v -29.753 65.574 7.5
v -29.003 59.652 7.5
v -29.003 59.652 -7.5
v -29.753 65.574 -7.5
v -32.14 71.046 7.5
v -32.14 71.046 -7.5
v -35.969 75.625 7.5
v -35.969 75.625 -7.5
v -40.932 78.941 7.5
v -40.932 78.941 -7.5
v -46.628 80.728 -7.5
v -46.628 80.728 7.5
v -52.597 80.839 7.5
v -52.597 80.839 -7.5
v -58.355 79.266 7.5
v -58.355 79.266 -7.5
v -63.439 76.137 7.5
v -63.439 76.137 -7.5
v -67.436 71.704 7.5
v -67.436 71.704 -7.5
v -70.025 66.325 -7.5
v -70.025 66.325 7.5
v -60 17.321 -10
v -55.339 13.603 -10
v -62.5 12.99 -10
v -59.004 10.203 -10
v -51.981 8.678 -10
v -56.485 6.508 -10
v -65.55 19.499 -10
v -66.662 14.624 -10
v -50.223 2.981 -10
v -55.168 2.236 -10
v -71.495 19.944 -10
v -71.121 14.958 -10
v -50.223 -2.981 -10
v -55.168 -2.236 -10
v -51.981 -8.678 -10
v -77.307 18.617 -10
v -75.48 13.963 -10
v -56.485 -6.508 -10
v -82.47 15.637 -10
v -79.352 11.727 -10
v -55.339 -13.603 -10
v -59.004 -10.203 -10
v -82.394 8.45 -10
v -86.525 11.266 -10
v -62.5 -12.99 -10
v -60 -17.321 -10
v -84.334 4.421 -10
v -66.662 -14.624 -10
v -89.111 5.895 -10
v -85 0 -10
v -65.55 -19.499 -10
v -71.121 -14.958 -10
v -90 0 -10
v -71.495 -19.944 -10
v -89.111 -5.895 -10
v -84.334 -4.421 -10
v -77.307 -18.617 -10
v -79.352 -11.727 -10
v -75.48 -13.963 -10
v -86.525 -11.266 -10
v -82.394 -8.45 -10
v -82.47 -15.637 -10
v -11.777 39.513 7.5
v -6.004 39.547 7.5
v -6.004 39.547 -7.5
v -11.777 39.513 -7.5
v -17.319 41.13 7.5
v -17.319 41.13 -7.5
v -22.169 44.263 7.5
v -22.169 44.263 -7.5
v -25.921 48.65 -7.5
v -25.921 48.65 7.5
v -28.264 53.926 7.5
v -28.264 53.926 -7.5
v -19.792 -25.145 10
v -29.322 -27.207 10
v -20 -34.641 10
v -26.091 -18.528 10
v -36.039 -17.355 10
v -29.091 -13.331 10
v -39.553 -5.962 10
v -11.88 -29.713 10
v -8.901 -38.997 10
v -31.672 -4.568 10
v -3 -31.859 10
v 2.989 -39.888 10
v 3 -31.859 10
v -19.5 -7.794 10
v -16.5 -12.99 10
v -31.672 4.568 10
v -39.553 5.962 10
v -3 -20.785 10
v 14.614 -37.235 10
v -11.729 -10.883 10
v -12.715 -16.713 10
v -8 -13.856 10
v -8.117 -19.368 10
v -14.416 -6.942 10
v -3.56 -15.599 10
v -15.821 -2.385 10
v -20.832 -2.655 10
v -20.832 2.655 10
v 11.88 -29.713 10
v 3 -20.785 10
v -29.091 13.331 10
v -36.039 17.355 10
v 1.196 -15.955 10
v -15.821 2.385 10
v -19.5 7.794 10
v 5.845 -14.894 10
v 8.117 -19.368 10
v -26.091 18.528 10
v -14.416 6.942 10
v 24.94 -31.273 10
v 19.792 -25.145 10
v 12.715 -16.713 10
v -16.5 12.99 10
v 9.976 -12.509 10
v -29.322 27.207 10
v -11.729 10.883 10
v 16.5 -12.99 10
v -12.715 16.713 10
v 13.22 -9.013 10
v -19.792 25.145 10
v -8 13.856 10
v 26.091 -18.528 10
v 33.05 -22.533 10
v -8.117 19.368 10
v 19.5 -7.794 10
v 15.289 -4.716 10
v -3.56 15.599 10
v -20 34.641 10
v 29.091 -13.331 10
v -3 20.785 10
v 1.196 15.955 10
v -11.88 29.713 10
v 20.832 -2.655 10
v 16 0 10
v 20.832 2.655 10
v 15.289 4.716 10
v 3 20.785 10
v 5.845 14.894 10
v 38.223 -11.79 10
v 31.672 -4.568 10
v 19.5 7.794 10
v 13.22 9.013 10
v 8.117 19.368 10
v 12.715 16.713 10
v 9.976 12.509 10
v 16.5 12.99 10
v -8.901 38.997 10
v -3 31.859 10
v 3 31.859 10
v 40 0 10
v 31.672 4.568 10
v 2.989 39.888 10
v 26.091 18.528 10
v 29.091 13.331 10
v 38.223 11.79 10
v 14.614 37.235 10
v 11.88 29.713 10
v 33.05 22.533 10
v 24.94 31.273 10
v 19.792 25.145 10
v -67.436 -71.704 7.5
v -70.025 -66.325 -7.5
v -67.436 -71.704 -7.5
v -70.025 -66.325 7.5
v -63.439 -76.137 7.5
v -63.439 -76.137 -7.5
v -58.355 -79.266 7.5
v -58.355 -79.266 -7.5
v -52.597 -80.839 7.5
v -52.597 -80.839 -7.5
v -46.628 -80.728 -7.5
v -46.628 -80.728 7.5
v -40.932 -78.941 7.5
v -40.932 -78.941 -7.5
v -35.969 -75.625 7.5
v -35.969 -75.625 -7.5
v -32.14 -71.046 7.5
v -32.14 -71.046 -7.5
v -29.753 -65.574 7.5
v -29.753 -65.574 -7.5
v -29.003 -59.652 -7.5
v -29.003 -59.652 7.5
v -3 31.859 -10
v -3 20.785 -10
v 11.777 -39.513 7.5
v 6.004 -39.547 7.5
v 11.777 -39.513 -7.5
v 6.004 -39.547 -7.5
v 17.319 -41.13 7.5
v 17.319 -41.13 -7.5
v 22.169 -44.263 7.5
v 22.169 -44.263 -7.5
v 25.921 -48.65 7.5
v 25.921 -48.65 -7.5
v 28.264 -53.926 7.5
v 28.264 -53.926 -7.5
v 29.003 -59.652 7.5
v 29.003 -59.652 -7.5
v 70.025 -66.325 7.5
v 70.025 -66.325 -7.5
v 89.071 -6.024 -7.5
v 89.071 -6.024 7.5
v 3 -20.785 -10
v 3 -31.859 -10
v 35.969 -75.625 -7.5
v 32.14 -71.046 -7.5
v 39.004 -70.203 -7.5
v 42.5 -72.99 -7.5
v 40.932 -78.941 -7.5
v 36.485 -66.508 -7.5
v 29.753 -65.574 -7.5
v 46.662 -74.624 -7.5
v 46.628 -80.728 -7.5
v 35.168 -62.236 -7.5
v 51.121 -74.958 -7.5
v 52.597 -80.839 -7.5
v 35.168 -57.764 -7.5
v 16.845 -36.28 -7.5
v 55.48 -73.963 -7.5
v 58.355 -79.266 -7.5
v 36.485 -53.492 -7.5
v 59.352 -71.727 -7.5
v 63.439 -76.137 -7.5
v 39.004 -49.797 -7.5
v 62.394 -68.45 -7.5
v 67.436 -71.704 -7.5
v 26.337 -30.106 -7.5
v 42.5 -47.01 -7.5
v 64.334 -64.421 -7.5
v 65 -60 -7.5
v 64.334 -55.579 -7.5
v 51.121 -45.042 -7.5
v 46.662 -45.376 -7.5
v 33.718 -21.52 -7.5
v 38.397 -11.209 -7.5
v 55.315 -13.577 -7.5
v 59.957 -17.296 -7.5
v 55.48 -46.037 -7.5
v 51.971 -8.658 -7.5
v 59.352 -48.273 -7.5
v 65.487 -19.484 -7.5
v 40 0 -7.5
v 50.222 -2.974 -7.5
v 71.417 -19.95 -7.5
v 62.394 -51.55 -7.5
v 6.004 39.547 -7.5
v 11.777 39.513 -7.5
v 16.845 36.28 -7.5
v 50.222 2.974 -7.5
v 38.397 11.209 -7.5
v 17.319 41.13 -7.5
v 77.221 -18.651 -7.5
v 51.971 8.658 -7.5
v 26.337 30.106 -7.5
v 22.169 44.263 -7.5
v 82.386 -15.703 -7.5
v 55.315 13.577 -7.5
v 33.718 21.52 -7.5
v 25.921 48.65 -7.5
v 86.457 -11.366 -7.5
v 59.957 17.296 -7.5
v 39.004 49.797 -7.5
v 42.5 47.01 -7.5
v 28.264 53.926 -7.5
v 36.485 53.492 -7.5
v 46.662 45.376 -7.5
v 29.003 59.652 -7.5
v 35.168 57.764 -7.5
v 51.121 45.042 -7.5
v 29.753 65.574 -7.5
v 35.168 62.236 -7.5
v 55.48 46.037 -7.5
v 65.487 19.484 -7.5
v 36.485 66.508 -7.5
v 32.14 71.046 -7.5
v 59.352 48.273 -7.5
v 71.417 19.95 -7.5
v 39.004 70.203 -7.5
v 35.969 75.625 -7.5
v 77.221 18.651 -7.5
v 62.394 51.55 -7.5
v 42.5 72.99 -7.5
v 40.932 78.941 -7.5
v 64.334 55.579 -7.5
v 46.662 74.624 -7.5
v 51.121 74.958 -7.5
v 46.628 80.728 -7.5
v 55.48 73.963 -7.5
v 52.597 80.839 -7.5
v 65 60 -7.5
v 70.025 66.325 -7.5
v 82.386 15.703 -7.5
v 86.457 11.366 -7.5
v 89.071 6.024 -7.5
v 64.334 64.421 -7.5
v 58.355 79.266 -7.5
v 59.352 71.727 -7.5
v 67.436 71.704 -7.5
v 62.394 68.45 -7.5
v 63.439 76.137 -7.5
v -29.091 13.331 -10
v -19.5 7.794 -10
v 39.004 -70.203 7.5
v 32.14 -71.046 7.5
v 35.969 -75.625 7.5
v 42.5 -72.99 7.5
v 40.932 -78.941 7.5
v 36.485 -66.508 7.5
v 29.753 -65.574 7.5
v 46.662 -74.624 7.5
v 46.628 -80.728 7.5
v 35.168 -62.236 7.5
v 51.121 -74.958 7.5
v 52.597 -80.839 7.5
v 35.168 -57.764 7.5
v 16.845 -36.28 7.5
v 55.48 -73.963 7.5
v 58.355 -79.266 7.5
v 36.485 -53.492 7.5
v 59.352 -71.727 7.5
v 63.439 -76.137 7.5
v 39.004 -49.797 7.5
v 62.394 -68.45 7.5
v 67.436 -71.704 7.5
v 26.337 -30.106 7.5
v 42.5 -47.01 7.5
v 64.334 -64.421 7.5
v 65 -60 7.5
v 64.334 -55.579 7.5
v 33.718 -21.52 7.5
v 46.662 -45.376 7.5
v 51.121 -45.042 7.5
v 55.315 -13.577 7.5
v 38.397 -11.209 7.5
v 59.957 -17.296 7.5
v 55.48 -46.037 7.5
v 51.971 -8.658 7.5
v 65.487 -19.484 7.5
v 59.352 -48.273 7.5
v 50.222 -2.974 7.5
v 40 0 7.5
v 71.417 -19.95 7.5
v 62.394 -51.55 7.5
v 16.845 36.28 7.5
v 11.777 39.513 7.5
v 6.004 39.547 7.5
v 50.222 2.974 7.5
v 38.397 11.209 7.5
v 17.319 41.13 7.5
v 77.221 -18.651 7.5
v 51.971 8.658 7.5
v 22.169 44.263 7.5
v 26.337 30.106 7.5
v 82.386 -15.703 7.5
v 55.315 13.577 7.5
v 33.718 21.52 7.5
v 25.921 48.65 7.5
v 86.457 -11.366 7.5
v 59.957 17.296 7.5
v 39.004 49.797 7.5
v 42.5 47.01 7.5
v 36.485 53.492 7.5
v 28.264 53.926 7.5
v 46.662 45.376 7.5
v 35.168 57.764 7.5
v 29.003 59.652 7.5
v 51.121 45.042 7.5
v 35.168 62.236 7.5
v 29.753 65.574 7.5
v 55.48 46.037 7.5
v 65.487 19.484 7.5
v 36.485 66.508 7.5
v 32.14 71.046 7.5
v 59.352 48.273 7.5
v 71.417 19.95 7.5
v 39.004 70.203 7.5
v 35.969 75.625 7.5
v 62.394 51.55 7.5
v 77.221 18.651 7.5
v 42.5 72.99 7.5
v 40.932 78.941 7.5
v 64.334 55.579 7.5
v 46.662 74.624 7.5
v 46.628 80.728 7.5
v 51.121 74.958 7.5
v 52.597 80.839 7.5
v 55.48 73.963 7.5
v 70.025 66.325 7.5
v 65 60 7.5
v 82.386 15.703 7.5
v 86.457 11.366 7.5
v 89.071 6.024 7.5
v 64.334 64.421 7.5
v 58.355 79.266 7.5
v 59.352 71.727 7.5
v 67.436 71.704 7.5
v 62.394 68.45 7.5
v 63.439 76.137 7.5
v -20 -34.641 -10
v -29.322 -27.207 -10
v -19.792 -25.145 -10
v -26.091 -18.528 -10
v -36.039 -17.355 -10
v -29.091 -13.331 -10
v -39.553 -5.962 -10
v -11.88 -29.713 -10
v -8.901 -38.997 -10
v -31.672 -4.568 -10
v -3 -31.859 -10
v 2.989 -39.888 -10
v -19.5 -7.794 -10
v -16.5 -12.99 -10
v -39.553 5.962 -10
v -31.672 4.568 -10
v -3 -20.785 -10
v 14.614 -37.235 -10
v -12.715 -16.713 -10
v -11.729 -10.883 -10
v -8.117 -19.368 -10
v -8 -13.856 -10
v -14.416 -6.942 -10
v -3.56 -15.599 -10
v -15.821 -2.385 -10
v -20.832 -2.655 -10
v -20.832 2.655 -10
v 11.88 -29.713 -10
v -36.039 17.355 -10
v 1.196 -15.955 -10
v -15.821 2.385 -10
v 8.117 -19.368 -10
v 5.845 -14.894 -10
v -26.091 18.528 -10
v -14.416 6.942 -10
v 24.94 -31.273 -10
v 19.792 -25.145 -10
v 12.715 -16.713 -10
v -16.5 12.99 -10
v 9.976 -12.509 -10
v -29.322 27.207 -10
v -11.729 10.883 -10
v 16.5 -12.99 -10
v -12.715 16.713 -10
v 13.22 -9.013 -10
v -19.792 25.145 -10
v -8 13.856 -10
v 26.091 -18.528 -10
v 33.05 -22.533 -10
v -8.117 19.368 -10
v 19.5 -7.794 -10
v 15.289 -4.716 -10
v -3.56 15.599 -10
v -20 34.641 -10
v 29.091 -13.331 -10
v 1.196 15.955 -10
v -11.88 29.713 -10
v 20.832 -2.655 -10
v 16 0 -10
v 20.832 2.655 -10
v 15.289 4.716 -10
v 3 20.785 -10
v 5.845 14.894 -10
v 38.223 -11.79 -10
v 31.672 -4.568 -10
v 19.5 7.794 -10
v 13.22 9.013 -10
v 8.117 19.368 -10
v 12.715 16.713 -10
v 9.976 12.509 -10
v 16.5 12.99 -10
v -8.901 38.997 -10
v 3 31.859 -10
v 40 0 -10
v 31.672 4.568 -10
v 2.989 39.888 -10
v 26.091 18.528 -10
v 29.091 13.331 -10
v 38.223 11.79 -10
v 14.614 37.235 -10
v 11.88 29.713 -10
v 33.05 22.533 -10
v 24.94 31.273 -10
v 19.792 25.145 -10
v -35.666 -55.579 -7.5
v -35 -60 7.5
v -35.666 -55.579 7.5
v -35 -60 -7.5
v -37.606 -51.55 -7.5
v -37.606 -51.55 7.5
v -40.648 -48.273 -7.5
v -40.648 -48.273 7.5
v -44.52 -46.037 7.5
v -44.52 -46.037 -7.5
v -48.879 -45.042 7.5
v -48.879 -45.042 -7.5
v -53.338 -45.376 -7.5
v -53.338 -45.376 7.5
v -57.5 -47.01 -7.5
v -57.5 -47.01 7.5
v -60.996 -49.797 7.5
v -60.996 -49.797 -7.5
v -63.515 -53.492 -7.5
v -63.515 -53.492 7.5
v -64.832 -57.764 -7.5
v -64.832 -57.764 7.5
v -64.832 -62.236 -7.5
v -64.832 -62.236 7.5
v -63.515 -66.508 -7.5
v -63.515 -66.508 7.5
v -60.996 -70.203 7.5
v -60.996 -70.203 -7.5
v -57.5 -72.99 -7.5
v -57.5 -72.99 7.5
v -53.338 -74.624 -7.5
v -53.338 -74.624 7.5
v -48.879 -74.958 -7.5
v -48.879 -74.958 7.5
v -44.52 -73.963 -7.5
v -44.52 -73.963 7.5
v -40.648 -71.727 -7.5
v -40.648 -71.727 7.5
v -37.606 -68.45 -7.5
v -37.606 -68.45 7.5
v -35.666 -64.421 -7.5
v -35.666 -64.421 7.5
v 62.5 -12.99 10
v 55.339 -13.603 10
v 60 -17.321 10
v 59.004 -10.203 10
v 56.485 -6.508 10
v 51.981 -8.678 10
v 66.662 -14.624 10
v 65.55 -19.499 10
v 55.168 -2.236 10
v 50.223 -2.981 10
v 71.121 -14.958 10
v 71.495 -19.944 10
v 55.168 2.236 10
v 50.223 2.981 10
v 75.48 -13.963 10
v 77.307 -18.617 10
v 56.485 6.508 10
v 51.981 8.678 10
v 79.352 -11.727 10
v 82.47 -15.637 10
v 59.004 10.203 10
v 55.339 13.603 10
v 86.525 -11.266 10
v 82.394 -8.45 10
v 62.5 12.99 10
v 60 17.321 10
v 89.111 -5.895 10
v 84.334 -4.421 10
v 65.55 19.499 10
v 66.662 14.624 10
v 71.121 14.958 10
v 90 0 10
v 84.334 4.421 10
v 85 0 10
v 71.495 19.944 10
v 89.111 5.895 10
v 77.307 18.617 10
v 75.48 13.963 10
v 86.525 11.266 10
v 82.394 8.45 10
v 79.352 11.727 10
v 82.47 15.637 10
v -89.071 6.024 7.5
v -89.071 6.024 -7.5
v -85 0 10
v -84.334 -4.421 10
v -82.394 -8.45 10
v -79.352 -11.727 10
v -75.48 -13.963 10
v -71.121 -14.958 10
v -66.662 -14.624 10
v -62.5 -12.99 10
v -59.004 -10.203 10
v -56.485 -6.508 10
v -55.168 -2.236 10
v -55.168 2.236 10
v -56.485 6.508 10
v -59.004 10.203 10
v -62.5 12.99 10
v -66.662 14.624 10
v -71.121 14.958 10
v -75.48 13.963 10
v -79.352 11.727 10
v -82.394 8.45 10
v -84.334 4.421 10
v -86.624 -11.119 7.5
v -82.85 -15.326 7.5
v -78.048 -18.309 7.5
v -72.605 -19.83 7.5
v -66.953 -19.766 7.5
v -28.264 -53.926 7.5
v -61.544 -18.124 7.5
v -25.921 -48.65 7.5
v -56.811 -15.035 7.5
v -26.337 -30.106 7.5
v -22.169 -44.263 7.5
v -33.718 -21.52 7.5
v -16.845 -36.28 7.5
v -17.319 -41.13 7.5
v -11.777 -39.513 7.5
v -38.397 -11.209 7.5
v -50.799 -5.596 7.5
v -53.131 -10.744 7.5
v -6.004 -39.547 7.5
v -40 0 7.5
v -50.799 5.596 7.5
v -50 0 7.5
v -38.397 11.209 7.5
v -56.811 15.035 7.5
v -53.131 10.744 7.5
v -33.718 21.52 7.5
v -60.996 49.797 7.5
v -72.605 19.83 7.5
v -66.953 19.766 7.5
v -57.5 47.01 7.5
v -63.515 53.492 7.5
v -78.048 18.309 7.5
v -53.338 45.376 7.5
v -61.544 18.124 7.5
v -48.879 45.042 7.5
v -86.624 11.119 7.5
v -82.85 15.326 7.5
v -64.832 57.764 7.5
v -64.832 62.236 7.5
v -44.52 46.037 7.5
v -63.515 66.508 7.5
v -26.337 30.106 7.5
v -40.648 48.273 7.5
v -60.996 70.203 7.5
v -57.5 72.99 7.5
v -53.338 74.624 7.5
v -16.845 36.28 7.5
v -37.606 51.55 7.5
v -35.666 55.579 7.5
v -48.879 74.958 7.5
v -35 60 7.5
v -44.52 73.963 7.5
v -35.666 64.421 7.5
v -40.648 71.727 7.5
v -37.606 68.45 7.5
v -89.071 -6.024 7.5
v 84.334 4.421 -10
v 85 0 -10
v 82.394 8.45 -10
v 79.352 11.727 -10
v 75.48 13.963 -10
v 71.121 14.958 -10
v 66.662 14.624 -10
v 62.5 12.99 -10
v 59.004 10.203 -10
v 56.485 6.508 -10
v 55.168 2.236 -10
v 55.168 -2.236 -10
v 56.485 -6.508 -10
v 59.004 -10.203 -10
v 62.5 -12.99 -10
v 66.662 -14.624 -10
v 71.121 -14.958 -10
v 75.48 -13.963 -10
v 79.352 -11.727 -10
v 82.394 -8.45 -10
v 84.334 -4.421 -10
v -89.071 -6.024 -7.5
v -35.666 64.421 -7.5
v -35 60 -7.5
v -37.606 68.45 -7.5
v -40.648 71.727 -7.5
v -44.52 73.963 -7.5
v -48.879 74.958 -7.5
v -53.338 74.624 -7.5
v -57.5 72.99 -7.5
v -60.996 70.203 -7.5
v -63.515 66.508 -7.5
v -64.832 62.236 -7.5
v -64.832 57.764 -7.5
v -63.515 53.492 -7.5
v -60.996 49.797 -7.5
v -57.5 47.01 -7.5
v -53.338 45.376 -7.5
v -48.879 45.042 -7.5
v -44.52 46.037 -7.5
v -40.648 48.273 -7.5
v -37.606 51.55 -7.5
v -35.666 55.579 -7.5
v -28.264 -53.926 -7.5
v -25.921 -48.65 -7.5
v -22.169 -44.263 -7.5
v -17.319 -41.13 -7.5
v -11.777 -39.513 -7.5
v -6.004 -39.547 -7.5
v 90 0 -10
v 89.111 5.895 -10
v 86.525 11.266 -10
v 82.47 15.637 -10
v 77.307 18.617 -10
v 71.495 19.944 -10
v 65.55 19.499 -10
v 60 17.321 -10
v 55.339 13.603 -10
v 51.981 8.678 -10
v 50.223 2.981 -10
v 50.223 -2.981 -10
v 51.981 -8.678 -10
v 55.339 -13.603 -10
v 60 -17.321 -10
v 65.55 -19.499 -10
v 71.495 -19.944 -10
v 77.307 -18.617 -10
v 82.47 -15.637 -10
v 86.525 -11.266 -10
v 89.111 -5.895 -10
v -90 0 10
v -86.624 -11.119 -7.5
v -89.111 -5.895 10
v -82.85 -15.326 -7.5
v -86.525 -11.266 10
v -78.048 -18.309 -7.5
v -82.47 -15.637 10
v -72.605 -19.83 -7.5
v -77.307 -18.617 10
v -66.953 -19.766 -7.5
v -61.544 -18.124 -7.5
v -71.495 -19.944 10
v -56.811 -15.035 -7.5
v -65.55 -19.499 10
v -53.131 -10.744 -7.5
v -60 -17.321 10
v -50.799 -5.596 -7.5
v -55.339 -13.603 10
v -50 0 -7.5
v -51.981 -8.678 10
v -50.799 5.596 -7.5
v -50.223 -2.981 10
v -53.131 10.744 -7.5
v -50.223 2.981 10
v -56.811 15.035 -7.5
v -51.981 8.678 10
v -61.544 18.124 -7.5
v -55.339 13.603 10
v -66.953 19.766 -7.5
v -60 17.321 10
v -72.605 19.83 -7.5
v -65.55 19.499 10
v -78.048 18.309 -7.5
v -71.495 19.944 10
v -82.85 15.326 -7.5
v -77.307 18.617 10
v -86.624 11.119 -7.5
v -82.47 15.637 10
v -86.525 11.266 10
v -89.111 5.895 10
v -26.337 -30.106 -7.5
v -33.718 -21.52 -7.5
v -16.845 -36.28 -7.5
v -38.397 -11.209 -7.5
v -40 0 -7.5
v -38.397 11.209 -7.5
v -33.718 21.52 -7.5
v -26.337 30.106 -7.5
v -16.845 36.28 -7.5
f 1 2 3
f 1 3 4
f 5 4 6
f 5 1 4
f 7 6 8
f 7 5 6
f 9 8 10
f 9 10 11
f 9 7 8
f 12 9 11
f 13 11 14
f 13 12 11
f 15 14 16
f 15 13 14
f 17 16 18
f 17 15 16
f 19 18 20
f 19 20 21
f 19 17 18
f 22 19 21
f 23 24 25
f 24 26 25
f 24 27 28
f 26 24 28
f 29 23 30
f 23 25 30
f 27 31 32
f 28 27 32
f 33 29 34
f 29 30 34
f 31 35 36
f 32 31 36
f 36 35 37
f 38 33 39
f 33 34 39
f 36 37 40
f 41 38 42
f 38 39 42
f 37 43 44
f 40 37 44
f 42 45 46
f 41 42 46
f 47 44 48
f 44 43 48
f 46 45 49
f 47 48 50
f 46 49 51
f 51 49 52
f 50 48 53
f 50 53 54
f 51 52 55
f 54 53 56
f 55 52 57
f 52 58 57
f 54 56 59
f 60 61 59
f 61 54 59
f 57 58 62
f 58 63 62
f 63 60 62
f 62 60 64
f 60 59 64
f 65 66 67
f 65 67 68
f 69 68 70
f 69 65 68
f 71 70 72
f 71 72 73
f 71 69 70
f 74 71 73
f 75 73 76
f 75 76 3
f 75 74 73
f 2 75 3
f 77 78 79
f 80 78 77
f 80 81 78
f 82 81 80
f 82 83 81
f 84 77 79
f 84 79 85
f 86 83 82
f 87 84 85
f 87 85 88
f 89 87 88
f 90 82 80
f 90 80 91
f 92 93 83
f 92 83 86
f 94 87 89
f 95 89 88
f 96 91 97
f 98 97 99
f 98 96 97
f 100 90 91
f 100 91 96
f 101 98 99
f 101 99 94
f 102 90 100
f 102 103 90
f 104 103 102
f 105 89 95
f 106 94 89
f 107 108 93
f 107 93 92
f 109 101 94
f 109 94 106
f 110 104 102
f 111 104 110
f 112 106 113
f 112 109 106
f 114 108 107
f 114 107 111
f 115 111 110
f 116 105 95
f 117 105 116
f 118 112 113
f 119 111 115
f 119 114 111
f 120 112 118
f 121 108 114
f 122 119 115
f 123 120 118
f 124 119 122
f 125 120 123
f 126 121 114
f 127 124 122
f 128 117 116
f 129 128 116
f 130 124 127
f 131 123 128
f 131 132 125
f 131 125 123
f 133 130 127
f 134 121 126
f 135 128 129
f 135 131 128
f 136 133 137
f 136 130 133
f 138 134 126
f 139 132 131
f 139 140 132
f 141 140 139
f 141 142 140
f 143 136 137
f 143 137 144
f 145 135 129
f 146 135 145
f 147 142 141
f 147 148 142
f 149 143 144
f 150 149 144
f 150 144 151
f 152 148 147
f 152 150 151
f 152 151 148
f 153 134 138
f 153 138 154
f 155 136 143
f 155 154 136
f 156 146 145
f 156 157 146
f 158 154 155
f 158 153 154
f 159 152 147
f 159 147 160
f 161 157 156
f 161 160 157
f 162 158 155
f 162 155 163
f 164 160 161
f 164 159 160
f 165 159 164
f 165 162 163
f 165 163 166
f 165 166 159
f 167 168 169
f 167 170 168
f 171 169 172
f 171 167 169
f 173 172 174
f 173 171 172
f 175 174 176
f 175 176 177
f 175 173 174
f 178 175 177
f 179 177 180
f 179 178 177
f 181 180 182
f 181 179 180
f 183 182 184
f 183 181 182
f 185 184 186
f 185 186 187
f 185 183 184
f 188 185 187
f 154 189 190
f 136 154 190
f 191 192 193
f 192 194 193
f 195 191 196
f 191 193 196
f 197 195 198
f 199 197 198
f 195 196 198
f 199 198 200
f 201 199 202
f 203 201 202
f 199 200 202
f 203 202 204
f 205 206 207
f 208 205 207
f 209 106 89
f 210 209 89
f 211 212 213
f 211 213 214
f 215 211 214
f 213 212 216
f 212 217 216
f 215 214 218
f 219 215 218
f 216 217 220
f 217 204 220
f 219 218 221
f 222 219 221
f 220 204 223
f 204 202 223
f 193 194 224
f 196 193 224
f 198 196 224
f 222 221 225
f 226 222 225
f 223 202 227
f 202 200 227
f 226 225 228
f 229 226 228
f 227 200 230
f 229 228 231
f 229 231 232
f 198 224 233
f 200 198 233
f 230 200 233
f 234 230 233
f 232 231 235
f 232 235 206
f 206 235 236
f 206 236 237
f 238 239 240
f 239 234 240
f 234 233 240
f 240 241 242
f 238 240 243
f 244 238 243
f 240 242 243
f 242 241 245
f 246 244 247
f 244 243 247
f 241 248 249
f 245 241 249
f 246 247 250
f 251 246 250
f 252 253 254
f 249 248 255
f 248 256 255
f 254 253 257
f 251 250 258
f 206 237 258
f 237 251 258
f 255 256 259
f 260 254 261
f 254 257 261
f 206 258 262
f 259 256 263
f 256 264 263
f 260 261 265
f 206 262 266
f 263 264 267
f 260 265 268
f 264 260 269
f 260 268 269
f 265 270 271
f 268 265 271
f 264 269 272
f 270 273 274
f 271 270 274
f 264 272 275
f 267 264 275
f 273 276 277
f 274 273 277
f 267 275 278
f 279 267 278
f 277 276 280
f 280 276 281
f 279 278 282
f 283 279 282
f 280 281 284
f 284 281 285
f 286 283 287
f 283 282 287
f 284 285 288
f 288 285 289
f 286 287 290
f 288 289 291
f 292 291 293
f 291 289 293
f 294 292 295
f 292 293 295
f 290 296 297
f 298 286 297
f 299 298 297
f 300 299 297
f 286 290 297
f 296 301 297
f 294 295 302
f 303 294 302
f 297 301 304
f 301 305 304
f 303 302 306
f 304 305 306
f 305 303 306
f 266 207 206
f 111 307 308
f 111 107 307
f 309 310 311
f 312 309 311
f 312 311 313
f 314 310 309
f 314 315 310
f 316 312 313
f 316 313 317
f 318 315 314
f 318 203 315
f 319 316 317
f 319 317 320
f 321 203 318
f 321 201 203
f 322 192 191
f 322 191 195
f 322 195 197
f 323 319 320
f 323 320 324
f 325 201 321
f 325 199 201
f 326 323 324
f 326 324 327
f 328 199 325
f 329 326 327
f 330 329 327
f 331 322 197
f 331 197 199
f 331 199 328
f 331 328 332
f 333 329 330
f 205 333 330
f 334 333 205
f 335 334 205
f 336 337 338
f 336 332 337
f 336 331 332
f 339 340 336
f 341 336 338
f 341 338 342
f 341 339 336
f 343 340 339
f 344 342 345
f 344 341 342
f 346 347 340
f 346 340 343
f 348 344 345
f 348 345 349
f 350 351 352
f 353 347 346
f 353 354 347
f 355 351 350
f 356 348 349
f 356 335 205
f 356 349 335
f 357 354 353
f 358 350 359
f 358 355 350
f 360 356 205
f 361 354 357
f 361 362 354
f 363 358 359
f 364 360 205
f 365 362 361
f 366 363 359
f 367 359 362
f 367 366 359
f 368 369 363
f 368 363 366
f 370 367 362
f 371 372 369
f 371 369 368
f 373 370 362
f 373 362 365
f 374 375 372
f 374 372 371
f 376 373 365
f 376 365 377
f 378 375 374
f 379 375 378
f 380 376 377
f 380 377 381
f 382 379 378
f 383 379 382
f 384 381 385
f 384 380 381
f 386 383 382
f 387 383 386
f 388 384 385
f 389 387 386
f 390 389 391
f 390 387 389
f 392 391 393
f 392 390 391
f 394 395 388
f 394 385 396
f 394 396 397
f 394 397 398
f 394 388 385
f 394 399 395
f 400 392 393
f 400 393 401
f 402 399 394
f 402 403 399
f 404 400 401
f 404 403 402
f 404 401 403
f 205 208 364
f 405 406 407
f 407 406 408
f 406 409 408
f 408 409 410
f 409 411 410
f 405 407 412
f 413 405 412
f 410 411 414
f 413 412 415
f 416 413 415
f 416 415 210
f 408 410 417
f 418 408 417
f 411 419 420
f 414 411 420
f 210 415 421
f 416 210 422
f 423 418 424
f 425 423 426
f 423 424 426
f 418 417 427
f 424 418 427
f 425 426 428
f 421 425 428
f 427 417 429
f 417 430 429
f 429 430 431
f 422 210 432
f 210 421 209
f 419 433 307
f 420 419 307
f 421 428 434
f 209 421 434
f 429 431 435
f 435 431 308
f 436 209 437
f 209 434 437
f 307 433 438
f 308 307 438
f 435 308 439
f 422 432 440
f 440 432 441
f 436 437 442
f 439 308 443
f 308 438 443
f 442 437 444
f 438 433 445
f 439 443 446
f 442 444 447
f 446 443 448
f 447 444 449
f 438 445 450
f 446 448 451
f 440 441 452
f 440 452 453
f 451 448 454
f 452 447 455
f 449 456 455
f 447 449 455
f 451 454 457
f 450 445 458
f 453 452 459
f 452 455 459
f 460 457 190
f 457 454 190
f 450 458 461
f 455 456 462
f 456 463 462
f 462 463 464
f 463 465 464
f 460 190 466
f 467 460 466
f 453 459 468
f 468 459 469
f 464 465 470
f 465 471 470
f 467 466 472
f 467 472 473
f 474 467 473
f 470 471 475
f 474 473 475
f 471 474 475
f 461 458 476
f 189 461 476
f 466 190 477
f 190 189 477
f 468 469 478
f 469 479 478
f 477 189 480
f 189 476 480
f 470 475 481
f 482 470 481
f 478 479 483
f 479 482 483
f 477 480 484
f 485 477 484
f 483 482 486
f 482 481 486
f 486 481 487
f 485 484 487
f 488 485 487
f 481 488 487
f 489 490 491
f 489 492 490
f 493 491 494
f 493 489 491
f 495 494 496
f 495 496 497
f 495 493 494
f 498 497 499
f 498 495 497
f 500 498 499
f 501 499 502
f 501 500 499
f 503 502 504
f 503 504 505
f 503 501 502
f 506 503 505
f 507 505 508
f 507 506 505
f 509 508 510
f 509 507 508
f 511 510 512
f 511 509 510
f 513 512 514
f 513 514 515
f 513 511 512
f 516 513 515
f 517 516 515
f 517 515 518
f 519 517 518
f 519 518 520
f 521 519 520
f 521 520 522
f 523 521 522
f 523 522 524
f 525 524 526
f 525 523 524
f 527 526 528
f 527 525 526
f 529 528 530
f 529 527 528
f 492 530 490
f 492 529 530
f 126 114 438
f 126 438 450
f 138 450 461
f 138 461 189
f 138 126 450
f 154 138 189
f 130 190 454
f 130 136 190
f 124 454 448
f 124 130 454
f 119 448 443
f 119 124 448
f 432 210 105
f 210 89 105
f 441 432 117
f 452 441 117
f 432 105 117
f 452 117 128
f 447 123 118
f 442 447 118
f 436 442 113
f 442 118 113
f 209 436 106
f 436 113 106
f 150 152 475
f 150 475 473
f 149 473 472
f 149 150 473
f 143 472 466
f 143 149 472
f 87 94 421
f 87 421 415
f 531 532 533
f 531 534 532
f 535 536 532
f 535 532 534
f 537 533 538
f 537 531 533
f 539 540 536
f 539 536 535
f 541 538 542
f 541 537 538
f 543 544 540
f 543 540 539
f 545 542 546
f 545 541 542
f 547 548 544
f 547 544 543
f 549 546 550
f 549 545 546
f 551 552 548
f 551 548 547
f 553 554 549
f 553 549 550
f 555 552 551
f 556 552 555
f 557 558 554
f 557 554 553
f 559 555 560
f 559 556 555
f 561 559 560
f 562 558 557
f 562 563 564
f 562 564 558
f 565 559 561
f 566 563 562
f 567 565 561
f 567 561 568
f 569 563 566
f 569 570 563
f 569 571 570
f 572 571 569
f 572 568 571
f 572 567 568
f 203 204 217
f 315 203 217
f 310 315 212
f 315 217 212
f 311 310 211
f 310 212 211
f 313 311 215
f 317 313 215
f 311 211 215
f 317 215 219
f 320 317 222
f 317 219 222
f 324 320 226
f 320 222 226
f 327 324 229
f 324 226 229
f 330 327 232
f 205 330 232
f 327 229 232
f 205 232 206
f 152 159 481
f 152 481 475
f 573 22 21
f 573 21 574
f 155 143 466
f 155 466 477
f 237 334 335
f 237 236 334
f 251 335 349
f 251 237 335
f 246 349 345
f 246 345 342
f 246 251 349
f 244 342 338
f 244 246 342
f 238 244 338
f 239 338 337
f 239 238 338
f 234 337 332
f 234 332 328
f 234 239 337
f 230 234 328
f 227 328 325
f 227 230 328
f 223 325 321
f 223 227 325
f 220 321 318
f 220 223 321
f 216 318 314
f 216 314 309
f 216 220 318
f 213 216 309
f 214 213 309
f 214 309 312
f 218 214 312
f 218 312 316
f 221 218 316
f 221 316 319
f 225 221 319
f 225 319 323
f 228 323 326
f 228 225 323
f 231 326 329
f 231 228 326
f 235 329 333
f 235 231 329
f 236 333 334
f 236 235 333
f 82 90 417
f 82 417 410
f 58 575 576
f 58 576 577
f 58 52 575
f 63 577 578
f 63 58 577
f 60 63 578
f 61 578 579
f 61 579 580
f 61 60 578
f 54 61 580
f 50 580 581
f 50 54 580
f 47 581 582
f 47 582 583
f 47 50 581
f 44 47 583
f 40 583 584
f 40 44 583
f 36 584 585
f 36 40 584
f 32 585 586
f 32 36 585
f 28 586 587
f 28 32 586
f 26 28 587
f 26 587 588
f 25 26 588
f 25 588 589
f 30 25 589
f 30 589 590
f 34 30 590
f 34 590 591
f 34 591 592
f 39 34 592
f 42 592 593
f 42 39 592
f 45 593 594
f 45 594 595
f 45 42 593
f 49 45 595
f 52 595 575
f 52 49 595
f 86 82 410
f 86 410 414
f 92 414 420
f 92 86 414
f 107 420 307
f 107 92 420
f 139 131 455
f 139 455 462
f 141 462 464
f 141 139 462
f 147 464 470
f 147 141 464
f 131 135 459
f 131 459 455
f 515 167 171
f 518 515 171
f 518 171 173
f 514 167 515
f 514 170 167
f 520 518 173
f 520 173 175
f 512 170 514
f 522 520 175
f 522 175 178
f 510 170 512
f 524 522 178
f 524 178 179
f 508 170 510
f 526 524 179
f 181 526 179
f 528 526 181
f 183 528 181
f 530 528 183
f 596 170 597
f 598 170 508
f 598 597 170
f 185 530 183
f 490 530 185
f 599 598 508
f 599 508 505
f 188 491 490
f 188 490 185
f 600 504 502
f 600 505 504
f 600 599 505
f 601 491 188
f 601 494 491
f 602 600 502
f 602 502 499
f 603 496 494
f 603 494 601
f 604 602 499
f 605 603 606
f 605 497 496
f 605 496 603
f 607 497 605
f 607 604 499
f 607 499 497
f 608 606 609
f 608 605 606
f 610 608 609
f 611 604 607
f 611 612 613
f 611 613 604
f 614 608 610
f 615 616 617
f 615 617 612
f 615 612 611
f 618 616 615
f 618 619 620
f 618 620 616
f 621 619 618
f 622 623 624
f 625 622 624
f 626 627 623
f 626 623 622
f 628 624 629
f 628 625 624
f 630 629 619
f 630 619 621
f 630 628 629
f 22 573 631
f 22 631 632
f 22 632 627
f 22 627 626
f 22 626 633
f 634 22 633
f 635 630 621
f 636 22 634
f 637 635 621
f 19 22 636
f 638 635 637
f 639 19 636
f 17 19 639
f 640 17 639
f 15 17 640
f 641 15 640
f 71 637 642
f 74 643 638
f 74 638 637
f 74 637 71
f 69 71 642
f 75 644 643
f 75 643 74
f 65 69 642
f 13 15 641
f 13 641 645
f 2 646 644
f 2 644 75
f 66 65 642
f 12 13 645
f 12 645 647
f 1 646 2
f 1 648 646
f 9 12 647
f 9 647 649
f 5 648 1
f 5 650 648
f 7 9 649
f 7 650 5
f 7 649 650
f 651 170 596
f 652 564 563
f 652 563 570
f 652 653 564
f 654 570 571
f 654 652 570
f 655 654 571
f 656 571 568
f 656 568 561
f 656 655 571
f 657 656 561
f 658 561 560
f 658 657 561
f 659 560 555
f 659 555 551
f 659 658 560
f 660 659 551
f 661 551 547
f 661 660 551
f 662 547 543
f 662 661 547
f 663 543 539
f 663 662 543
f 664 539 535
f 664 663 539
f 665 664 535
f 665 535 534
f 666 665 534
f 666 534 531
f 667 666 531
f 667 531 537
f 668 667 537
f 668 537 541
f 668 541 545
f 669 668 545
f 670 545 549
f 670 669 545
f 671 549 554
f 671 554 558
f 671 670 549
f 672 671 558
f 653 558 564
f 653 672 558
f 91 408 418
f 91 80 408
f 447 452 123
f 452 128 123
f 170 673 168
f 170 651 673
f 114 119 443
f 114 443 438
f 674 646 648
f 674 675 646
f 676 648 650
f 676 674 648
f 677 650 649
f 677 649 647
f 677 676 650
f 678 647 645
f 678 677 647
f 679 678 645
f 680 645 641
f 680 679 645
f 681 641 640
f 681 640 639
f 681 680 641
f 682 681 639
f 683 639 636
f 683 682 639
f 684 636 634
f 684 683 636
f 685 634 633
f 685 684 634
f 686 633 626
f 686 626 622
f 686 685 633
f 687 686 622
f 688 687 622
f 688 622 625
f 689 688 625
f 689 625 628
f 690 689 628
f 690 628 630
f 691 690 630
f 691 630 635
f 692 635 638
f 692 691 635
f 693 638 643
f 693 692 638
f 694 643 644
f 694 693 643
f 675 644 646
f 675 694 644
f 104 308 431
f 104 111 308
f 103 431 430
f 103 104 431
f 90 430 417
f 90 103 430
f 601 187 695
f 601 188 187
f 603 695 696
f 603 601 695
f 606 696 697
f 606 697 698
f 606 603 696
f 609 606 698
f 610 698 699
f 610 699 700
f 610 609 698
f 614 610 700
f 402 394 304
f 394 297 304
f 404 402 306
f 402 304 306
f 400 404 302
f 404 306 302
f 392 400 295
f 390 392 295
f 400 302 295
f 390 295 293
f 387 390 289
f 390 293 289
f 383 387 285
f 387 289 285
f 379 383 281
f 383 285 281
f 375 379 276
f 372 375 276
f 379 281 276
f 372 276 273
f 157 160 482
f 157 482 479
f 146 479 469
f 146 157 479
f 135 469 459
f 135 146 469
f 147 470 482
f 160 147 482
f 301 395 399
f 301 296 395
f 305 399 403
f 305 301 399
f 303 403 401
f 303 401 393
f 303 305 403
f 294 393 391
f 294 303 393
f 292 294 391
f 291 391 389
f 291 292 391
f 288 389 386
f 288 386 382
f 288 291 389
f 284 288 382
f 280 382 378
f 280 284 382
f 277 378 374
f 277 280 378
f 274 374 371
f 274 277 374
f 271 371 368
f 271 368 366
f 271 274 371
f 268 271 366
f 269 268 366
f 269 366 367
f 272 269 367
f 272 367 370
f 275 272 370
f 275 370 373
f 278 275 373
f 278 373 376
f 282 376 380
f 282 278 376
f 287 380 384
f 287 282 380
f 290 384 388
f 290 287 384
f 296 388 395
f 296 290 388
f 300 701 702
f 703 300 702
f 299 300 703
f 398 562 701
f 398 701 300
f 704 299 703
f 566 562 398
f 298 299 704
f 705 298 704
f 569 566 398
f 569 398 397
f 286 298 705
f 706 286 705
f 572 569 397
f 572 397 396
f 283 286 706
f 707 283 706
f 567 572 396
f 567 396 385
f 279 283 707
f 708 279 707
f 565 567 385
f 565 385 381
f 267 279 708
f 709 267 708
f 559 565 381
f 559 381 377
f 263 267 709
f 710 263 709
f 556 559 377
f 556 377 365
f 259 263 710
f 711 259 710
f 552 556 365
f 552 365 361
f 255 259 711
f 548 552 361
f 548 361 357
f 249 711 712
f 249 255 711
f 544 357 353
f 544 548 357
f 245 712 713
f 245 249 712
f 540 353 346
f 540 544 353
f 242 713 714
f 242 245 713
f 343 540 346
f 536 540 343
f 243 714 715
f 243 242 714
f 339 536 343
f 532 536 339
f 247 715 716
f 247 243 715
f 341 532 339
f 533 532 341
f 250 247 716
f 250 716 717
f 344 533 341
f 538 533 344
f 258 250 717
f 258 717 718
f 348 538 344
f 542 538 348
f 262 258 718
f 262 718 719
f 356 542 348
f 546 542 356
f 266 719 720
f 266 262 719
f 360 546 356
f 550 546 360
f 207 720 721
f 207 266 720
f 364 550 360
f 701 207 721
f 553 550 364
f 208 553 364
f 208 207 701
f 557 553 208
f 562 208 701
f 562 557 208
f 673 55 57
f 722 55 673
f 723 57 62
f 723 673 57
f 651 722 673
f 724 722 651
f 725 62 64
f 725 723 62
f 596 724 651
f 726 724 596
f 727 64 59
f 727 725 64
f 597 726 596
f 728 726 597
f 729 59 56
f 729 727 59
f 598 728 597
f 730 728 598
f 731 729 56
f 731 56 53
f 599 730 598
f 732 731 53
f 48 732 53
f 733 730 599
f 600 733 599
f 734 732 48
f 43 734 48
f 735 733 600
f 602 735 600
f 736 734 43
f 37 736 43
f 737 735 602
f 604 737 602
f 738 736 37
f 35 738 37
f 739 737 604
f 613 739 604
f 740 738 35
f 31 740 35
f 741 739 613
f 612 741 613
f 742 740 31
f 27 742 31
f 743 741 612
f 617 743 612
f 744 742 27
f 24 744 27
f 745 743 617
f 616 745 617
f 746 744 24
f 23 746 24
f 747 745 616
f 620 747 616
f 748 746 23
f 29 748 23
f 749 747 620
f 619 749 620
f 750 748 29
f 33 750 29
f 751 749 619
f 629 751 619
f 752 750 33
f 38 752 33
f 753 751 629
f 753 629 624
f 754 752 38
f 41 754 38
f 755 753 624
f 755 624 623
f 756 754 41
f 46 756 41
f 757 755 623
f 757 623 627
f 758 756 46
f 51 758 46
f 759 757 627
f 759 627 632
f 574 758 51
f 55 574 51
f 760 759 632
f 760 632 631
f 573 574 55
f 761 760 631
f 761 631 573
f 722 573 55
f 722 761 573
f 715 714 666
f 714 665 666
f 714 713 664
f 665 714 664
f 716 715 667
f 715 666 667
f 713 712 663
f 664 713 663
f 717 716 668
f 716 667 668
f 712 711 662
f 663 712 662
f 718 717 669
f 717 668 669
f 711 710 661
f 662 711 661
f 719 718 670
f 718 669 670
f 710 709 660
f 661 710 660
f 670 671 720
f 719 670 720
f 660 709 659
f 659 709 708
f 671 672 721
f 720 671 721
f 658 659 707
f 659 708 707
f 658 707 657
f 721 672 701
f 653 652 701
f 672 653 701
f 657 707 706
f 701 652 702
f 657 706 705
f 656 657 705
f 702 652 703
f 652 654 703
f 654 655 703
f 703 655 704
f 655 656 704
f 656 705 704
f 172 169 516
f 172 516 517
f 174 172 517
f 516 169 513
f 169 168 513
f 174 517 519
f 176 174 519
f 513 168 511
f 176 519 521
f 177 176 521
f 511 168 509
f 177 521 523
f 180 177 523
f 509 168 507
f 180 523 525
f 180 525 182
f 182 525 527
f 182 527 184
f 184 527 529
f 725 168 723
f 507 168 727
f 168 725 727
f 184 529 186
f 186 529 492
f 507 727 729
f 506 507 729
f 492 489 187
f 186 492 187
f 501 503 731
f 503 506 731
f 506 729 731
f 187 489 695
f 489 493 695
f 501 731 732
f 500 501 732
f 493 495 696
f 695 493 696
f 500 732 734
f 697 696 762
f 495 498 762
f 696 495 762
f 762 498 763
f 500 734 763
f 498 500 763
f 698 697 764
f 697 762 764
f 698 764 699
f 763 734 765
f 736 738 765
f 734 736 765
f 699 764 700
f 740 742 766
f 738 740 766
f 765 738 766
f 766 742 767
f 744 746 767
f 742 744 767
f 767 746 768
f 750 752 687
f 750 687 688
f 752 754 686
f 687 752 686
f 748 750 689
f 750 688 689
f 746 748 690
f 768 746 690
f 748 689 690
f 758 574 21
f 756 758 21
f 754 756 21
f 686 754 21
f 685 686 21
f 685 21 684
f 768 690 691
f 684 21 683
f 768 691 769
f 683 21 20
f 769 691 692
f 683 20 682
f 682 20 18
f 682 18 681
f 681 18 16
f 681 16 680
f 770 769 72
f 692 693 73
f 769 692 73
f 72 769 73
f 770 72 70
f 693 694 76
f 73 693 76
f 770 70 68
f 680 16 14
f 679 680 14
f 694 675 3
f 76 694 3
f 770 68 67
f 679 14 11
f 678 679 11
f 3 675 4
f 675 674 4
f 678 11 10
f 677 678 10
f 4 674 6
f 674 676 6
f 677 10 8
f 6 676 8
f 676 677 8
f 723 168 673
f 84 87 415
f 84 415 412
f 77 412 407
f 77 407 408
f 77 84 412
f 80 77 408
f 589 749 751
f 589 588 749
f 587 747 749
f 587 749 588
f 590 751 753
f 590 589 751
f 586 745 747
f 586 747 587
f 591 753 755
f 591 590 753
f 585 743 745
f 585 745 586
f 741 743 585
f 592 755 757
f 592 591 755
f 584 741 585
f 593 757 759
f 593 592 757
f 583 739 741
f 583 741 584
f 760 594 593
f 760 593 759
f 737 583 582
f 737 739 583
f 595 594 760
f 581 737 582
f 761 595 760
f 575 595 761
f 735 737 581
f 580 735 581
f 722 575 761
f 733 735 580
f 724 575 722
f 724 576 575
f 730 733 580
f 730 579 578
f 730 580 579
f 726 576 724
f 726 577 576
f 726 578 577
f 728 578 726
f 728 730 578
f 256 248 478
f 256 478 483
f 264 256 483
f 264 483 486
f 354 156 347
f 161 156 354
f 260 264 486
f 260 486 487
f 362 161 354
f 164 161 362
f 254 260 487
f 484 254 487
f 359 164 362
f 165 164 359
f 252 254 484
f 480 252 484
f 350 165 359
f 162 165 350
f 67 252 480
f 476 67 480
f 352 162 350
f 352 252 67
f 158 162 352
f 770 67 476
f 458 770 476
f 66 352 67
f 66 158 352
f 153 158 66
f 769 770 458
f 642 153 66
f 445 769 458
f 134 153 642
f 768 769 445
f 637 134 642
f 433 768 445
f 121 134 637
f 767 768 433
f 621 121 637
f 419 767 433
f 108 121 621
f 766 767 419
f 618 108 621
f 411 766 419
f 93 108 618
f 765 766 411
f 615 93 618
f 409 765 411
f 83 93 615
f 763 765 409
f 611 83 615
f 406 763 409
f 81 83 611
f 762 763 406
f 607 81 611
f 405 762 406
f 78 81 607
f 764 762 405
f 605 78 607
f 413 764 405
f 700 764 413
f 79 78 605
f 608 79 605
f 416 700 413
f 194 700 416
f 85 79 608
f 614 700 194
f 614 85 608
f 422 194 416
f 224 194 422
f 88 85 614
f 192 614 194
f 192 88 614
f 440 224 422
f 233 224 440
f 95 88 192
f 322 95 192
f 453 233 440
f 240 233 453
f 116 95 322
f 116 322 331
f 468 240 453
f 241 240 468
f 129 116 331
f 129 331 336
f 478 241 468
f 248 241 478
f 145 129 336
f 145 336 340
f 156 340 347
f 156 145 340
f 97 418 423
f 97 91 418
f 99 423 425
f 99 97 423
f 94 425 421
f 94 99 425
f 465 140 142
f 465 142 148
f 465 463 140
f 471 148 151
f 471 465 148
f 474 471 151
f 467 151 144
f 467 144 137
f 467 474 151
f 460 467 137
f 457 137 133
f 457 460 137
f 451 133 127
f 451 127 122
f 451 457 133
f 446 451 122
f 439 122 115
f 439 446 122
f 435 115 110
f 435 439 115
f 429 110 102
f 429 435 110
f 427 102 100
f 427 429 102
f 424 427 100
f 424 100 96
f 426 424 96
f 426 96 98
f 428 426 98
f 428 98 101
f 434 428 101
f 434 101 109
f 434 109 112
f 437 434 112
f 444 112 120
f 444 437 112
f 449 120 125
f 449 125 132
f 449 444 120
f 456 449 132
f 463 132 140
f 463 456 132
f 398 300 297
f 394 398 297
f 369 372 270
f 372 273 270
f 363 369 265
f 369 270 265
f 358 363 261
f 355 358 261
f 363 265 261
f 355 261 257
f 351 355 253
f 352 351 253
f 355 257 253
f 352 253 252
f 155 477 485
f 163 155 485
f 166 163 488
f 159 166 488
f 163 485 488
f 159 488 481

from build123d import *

# Parameters (mm, degrees)
SKETCH1_R             = 20
SKETCH1_R_2           = 15
BOSS_EXTRUDE2_DEPTH   = 10
SKETCH1_R_3           = 40
SKETCH1_R_4           = 16
BOSS_EXTRUDE2_2_DEPTH = 10
BOSS_EXTRUDE2_3_DEPTH = 10
SKETCH1_4_R           = 15
BOSS_EXTRUDE3_DEPTH   = 7.5


with BuildPart() as part:
    # Sketch1 → Boss-Extrude2 (new, symmetric)
    with BuildSketch(Plane.XY):
        with Locations((70, 0)):
            Circle(SKETCH1_R)
        with Locations((70, 0)):
            Circle(SKETCH1_R_2, mode=Mode.SUBTRACT)
    extrude(amount=BOSS_EXTRUDE2_DEPTH, both=True)



with BuildPart() as body_2:
    # Sketch1 → Boss-Extrude2 2 (new, symmetric)
    with BuildSketch(Plane.XY):
        Circle(SKETCH1_R_3)
        with BuildLine():
            ThreePointArc((-16.5, -12.990381057), (-10.5, -18.186533479), (-3, -20.784609691))
            Line((-3, -20.784609691), (-3, -31.859064644))
            ThreePointArc((-3, -31.859064644), (-16, -27.712812921), (-26.090759323, -18.527608533))
            Line((-26.090759323, -18.527608533), (-16.5, -12.990381057))
        make_face(mode=Mode.SUBTRACT)
        with BuildLine():
            Line((3, -31.859064644), (3, -20.784609691))
            ThreePointArc((3, -20.784609691), (10.5, -18.186533479), (16.5, -12.990381057))
            Line((16.5, -12.990381057), (26.090759323, -18.527608533))
            ThreePointArc((26.090759323, -18.527608533), (16, -27.712812921), (3, -31.859064644))
        make_face(mode=Mode.SUBTRACT)
        Circle(SKETCH1_R_4, mode=Mode.SUBTRACT)
        with BuildLine():
            ThreePointArc((19.5, -7.794228634), (21, 0), (19.5, 7.794228634))
            Line((19.5, 7.794228634), (29.090759323, 13.331456111))
            ThreePointArc((29.090759323, 13.331456111), (32, 0), (29.090759323, -13.331456111))
            Line((29.090759323, -13.331456111), (19.5, -7.794228634))
        make_face(mode=Mode.SUBTRACT)
        with BuildLine():
            ThreePointArc((-19.5, 7.794228634), (-21, 0), (-19.5, -7.794228634))
            Line((-19.5, -7.794228634), (-29.090759323, -13.331456111))
            ThreePointArc((-29.090759323, -13.331456111), (-32, 0), (-29.090759323, 13.331456111))
            Line((-29.090759323, 13.331456111), (-19.5, 7.794228634))
        make_face(mode=Mode.SUBTRACT)
        with BuildLine():
            ThreePointArc((-3, 20.784609691), (-10.5, 18.186533479), (-16.5, 12.990381057))
            Line((-16.5, 12.990381057), (-26.090759323, 18.527608533))
            ThreePointArc((-26.090759323, 18.527608533), (-16, 27.712812921), (-3, 31.859064644))
            Line((-3, 31.859064644), (-3, 20.784609691))
        make_face(mode=Mode.SUBTRACT)
        with BuildLine():
            ThreePointArc((16.5, 12.990381057), (10.5, 18.186533479), (3, 20.784609691))
            Line((3, 20.784609691), (3, 31.859064644))
            ThreePointArc((3, 31.859064644), (16, 27.712812921), (26.090759323, 18.527608533))
            Line((26.090759323, 18.527608533), (16.5, 12.990381057))
        make_face(mode=Mode.SUBTRACT)
    extrude(amount=BOSS_EXTRUDE2_2_DEPTH, both=True)


with BuildPart() as body_3:
    # Sketch1 → Boss-Extrude2 3 (new, symmetric)
    with BuildSketch(Plane.XY):
        with Locations((-70, 0)):
            Circle(SKETCH1_R)
        with Locations((-70, 0)):
            Circle(SKETCH1_R_2, mode=Mode.SUBTRACT)
    extrude(amount=BOSS_EXTRUDE2_3_DEPTH, both=True)


with BuildPart() as part_1:
    add(part.part)

    add(body_2.part)  # Boss-Extrude3 merges body 2

    add(body_3.part)  # Boss-Extrude3 merges body 3
    # Sketch1<4> → Boss-Extrude3 (add, symmetric)
    # profile 1 of 2: a face of its own
    with BuildSketch(Plane.XY):
        with BuildLine():
            Line((89.071294105, 6.023764702), (70.02485881, 66.324952937))
            ThreePointArc((70.02485881, 66.324952937), (46.6282273, 80.727545655), (29.002885891, 59.651863383))
            ThreePointArc((29.002885891, 59.651863383), (22.168588856, 44.262528341), (6.003756239, 39.546869801))
            ThreePointArc((6.003756239, 39.546869801), (40, 0), (6.003756239, -39.546869801))
            ThreePointArc((6.003756239, -39.546869801), (22.168588856, -44.262528341), (29.002885891, -59.651863383))
            ThreePointArc((29.002885891, -59.651863383), (46.6282273, -80.727545655), (70.02485881, -66.324952937))
            Line((70.02485881, -66.324952937), (89.071294105, -6.023764702))
            ThreePointArc((89.071294105, -6.023764702), (50, 0), (89.071294105, 6.023764702))
        make_face()
        with Locations((50, -60)):
            Circle(SKETCH1_4_R, mode=Mode.SUBTRACT)
        with Locations((50, 60)):
            Circle(SKETCH1_4_R, mode=Mode.SUBTRACT)
    # profile 2 of 2: a face of its own
    with BuildSketch(Plane.XY):
        with BuildLine():
            ThreePointArc((-6.003756239, -39.546869801), (-40, 0), (-6.003756239, 39.546869801))
            ThreePointArc((-6.003756239, 39.546869801), (-22.168588856, 44.262528341), (-29.002885891, 59.651863383))
            ThreePointArc((-29.002885891, 59.651863383), (-46.6282273, 80.727545655), (-70.02485881, 66.324952937))
            Line((-70.02485881, 66.324952937), (-89.071294105, 6.023764702))
            ThreePointArc((-89.071294105, 6.023764702), (-50, 0), (-89.071294105, -6.023764702))
            Line((-89.071294105, -6.023764702), (-70.02485881, -66.324952937))
            ThreePointArc((-70.02485881, -66.324952937), (-46.6282273, -80.727545655), (-29.002885891, -59.651863383))
            ThreePointArc((-29.002885891, -59.651863383), (-22.168588856, -44.262528341), (-6.003756239, -39.546869801))
        make_face()
        with Locations((-50, -60)):
            Circle(SKETCH1_4_R, mode=Mode.SUBTRACT)
        with Locations((-50, 60)):
            Circle(SKETCH1_4_R, mode=Mode.SUBTRACT)
    extrude(amount=BOSS_EXTRUDE3_DEPTH, both=True)


solid = part_1.part
